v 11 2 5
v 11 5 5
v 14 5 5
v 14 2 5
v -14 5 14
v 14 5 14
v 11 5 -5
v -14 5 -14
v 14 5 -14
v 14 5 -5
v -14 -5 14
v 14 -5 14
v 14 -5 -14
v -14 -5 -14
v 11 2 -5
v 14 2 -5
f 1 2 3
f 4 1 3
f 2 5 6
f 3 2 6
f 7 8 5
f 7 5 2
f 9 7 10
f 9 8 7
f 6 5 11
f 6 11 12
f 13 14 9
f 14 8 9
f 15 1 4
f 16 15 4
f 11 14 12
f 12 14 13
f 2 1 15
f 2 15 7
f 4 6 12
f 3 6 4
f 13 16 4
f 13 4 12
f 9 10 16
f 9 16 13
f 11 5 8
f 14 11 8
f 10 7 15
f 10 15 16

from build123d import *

# Parameters (mm, degrees)
SKETCH1_W           = 28
SKETCH1_H           = 28
BOSS_EXTRUDE1_DEPTH = 5
SKETCH2_W           = 3
SKETCH2_H           = 3
CUT_EXTRUDE1_DEPTH  = 5


with BuildPart() as part:
    # Sketch1 → Boss-Extrude1 (new body, symmetric)
    with BuildSketch(Plane(origin=(0, 0, 0), x_dir=(1, 0, 0), z_dir=(0, 1, 0))):
        Rectangle(SKETCH1_W, SKETCH1_H)
    extrude(amount=BOSS_EXTRUDE1_DEPTH, both=True)

    # Sketch2 → Cut-Extrude1 (cut, symmetric)
    with BuildSketch(Plane.XY):
        with Locations((12.5, 3.5)):
            Rectangle(SKETCH2_W, SKETCH2_H)
    extrude(amount=CUT_EXTRUDE1_DEPTH, both=True, mode=Mode.SUBTRACT)


solid = part.part
